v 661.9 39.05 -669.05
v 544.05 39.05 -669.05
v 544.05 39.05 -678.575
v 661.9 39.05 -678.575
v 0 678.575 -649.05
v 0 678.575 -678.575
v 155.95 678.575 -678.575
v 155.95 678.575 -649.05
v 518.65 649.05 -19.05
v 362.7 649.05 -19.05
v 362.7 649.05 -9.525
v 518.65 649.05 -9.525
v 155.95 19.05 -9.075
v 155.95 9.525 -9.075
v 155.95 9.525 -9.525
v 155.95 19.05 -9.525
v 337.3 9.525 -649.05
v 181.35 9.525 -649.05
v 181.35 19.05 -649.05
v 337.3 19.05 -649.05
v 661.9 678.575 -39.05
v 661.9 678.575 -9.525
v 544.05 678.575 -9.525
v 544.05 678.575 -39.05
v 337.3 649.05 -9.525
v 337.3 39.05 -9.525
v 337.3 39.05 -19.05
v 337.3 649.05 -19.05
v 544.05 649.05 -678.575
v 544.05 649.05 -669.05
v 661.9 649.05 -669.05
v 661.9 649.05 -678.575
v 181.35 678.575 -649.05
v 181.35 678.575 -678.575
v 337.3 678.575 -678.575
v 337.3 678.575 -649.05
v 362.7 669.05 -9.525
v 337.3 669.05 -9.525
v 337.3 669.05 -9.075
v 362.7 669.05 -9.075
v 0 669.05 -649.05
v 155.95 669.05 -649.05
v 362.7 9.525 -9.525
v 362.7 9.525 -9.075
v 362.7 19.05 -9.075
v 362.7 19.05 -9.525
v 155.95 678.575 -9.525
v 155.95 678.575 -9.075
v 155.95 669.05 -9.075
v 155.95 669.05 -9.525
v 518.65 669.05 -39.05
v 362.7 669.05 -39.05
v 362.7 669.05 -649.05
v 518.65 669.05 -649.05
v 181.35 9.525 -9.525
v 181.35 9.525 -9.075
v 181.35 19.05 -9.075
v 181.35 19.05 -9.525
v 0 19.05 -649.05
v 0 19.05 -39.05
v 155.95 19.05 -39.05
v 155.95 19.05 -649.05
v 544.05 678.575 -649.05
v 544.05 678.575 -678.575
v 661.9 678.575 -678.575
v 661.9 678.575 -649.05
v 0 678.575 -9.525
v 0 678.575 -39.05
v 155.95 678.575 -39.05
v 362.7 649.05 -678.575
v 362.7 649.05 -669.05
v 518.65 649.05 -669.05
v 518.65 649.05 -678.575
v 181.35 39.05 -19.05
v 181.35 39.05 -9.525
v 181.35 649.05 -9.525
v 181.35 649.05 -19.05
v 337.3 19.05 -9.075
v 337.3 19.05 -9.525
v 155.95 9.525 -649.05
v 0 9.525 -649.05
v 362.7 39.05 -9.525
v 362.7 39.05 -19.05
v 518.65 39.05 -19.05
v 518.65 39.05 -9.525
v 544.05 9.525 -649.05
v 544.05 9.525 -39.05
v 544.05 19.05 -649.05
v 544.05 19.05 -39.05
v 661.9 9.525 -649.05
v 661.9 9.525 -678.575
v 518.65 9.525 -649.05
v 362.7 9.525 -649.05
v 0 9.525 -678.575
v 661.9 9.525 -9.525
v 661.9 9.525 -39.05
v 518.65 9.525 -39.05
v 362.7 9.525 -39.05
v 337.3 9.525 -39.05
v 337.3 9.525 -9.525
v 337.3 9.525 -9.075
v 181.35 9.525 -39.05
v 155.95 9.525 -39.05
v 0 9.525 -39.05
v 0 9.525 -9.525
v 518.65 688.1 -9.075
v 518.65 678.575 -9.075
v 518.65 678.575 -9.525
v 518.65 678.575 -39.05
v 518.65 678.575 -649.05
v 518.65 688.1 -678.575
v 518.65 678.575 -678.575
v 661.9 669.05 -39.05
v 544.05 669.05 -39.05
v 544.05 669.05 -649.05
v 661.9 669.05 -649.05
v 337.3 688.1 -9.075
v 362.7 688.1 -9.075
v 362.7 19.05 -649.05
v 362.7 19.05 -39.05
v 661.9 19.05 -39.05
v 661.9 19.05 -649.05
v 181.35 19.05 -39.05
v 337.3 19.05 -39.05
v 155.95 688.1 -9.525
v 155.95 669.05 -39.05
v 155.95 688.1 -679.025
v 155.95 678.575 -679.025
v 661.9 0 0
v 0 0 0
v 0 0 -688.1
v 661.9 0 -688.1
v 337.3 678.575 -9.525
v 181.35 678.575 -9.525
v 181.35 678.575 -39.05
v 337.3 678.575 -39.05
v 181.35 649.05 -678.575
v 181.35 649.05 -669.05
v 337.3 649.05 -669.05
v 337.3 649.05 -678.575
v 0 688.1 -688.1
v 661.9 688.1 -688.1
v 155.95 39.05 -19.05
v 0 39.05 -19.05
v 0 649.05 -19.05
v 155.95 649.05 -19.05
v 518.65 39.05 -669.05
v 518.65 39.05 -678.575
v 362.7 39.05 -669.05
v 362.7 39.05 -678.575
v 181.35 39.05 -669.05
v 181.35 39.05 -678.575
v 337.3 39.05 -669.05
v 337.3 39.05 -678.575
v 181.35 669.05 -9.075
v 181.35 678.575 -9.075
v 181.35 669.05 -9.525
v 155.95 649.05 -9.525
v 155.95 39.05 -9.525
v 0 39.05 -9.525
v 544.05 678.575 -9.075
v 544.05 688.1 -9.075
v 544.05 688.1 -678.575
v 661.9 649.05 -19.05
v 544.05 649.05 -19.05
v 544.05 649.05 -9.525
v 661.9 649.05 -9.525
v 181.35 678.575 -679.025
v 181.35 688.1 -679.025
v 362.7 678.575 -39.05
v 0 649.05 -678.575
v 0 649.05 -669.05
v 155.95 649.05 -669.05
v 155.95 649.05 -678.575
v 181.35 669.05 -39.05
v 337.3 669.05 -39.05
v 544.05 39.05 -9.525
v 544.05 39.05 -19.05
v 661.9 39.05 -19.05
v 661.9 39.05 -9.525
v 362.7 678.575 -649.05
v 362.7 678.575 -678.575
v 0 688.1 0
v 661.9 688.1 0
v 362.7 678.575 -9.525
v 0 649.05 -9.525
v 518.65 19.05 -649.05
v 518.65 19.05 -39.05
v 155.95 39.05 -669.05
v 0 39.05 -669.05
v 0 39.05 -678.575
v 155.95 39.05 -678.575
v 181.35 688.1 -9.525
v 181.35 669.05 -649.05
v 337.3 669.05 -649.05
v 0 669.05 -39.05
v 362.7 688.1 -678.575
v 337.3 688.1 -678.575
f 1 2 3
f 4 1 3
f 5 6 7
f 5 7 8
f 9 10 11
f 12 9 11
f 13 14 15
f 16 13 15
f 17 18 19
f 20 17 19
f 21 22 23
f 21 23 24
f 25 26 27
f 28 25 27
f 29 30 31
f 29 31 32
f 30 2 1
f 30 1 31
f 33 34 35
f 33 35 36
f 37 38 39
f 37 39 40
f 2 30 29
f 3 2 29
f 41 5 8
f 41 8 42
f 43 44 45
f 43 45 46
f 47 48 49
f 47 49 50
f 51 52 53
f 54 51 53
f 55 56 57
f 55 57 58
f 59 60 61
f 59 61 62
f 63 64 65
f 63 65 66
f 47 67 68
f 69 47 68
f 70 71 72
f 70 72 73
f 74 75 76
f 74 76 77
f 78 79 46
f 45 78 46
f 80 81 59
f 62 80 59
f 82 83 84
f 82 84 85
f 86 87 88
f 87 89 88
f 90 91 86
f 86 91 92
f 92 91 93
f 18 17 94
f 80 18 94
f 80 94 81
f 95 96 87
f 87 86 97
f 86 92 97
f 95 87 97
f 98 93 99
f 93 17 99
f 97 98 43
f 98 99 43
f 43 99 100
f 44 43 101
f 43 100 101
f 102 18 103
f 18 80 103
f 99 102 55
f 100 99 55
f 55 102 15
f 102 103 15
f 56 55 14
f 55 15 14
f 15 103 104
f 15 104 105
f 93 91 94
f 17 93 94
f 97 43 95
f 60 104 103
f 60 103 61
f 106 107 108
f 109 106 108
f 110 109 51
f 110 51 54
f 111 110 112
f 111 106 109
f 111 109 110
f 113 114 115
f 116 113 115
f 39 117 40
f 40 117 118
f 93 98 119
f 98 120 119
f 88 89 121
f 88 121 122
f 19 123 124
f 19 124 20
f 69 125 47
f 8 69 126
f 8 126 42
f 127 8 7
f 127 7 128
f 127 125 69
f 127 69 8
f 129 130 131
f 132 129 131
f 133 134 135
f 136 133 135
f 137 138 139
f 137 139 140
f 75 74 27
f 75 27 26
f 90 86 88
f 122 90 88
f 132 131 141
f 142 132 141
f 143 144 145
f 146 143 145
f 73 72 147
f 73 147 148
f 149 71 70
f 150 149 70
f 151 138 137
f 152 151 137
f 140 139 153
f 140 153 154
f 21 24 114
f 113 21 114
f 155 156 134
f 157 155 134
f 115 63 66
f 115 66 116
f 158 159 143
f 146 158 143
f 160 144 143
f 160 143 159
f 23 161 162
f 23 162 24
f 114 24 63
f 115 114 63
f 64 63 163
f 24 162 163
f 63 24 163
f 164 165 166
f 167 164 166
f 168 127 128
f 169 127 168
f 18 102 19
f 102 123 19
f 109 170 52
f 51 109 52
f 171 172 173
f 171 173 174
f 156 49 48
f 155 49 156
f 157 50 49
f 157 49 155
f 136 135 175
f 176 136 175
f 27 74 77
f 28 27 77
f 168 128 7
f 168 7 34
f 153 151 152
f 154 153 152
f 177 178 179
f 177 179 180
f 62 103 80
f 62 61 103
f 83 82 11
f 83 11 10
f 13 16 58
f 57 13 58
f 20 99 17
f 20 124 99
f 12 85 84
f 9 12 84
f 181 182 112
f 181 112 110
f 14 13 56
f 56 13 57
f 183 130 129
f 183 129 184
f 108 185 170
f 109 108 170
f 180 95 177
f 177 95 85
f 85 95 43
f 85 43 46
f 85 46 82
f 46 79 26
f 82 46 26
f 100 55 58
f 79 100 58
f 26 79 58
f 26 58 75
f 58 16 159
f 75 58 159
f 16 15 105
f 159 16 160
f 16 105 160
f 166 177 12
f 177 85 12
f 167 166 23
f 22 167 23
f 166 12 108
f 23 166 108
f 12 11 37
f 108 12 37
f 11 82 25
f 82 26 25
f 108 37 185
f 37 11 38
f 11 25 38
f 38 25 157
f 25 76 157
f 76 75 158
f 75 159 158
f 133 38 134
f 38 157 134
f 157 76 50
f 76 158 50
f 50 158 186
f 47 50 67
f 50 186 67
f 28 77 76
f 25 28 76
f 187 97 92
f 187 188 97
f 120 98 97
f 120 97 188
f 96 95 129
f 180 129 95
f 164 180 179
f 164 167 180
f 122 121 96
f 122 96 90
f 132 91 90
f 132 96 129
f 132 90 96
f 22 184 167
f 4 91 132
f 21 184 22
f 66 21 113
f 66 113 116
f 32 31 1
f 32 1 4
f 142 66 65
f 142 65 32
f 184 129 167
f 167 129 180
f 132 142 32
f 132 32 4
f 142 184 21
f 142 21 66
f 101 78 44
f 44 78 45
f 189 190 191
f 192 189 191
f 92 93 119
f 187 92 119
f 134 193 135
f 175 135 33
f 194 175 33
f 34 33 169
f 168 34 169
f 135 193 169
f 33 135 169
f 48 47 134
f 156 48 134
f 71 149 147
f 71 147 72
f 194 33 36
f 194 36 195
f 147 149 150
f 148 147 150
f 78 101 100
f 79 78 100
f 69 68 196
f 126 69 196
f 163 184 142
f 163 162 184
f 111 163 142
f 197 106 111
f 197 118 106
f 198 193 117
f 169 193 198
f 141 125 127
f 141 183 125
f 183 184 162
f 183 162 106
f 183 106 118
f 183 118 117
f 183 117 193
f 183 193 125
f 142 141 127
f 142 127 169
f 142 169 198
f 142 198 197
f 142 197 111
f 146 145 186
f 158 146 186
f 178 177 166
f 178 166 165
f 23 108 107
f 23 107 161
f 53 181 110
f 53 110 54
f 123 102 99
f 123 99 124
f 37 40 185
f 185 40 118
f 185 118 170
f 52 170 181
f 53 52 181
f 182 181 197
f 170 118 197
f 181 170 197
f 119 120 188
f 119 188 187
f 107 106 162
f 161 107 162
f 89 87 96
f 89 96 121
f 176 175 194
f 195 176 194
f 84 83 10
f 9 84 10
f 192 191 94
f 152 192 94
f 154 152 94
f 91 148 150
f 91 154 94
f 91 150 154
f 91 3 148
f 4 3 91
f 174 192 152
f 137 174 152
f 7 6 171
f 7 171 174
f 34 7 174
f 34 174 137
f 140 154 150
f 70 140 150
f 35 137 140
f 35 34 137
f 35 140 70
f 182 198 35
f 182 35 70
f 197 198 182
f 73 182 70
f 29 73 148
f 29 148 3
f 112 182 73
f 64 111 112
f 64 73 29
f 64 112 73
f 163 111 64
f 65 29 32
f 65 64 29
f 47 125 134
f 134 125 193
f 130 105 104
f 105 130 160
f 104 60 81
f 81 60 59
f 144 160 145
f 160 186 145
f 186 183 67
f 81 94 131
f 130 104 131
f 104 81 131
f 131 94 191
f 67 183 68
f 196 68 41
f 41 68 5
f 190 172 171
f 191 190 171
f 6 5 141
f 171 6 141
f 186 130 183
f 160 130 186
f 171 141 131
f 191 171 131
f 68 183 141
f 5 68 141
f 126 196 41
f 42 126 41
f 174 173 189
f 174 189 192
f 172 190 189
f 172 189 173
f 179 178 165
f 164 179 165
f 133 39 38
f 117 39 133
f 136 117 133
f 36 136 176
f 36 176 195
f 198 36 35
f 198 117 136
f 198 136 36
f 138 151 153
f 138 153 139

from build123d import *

# Parameters (mm, degrees)
SKETCH1_W            = 688.1
SKETCH1_H            = 688.1
SKETCH1_W_2          = 650
SKETCH1_H_2          = 650
BOSS_EXTRUDE1_DEPTH  = 661.9
SKETCH3_W            = 25.4
SKETCH3_H            = 650
CUT_EXTRUDE1_DEPTH   = 9.525
SKETCH4_W            = 25.4
SKETCH4_H            = 669.5
SKETCH4_H_2          = 669.05
CUT_EXTRUDE3_DEPTH   = 9.525
SKETCH6_W            = 25.4
SKETCH6_H            = 669.5
CUT_EXTRUDE4_DEPTH   = 9.525
CUT_EXTRUDE5_DEPTH   = 700
MIRROR6_COPY_1_DEPTH = 700


with BuildPart() as part:
    # Sketch1 → Boss-Extrude1 (new body)
    with BuildSketch(Plane(origin=(0, 0, 0), x_dir=(0, 0, -1), z_dir=(1, 0, 0))):
        with Locations((344.05, 344.05)):
            Rectangle(SKETCH1_W, SKETCH1_H)
        with Locations((344.05, 344.05)):
            Rectangle(SKETCH1_W_2, SKETCH1_H_2, mode=Mode.SUBTRACT)
    extrude(amount=BOSS_EXTRUDE1_DEPTH)

    # Sketch3 → Cut-Extrude1 (cut)
    with BuildSketch(Plane.XY.offset(-669.05)):
        with Locations((168.65, 344.05)):
            Rectangle(SKETCH3_W, SKETCH3_H)
        with Locations((350, 344.05)):
            Rectangle(SKETCH3_W, SKETCH3_H)
        with Locations((531.35, 344.05)):
            Rectangle(SKETCH3_W, SKETCH3_H)
    cut_extrude1 = extrude(amount=-CUT_EXTRUDE1_DEPTH, mode=Mode.SUBTRACT)

    # Mirror2: Cut-Extrude1 across plane
    add(cut_extrude1.mirror(Plane(origin=(0, 0, -344.05), x_dir=(1, 0, 0), z_dir=(0, 0, -1))), mode=Mode.SUBTRACT)

    # Sketch4 → Cut-Extrude3 (cut)
    with BuildSketch(Plane(origin=(0, 19.05, 0), x_dir=(1, 0, 0), z_dir=(0, 1, 0))):
        with Locations((168.65, 343.825)):
            Rectangle(SKETCH4_W, SKETCH4_H)
        with Locations((350, 343.825)):
            Rectangle(SKETCH4_W, SKETCH4_H)
        with Locations((531.35, 344.05)):
            Rectangle(SKETCH4_W, SKETCH4_H_2)
    cut_extrude3 = extrude(amount=-CUT_EXTRUDE3_DEPTH, mode=Mode.SUBTRACT)

    # Mirror4: Cut-Extrude3 across plane
    add(cut_extrude3.mirror(Plane.ZX.offset(344.05)), mode=Mode.SUBTRACT)

    # Sketch6 → Cut-Extrude4 (cut)
    with BuildSketch(Plane(origin=(0, 688.1, 0), x_dir=(1, 0, 0), z_dir=(0, 1, 0))):
        with Locations((168.65, 344.275)):
            Rectangle(SKETCH6_W, SKETCH6_H)
        with Locations((350, 343.825)):
            Rectangle(SKETCH6_W, SKETCH6_H)
        with Locations((531.35, 343.825)):
            Rectangle(SKETCH6_W, SKETCH6_H)
    extrude(amount=-CUT_EXTRUDE4_DEPTH, mode=Mode.SUBTRACT)

    # Sketch7 → Cut-Extrude5 (cut)
    with BuildSketch(Plane.ZY):
        Polygon((-19.05, 39.05), (-9.525, 39.05), (-9.525, 9.525), (-39.05, 9.525), (-39.05, 19.05), (-19.05, 19.05), align=None)
    cut_extrude5 = extrude(amount=-CUT_EXTRUDE5_DEPTH, mode=Mode.SUBTRACT)

    # Mirror5: Cut-Extrude5 across plane
    add(cut_extrude5.mirror(Plane(origin=(0, 0, -344.05), x_dir=(1, 0, 0), z_dir=(0, 0, -1))), mode=Mode.SUBTRACT)

    # Mirror6: Cut-Extrude5 across plane
    add(cut_extrude5.mirror(Plane.ZX.offset(344.05)), mode=Mode.SUBTRACT)

    # Mirror6 copy 1 sketch → Mirror6 copy 1 (cut)
    with BuildSketch(Plane(origin=(0, 688.1, -688.1), x_dir=(0, 0, -1), z_dir=(-1, 0, 0))):
        Polygon((-19.05, 39.05), (-9.525, 39.05), (-9.525, 9.525), (-39.05, 9.525), (-39.05, 19.05), (-19.05, 19.05), align=None)
    extrude(amount=-MIRROR6_COPY_1_DEPTH, mode=Mode.SUBTRACT)


solid = part.part
